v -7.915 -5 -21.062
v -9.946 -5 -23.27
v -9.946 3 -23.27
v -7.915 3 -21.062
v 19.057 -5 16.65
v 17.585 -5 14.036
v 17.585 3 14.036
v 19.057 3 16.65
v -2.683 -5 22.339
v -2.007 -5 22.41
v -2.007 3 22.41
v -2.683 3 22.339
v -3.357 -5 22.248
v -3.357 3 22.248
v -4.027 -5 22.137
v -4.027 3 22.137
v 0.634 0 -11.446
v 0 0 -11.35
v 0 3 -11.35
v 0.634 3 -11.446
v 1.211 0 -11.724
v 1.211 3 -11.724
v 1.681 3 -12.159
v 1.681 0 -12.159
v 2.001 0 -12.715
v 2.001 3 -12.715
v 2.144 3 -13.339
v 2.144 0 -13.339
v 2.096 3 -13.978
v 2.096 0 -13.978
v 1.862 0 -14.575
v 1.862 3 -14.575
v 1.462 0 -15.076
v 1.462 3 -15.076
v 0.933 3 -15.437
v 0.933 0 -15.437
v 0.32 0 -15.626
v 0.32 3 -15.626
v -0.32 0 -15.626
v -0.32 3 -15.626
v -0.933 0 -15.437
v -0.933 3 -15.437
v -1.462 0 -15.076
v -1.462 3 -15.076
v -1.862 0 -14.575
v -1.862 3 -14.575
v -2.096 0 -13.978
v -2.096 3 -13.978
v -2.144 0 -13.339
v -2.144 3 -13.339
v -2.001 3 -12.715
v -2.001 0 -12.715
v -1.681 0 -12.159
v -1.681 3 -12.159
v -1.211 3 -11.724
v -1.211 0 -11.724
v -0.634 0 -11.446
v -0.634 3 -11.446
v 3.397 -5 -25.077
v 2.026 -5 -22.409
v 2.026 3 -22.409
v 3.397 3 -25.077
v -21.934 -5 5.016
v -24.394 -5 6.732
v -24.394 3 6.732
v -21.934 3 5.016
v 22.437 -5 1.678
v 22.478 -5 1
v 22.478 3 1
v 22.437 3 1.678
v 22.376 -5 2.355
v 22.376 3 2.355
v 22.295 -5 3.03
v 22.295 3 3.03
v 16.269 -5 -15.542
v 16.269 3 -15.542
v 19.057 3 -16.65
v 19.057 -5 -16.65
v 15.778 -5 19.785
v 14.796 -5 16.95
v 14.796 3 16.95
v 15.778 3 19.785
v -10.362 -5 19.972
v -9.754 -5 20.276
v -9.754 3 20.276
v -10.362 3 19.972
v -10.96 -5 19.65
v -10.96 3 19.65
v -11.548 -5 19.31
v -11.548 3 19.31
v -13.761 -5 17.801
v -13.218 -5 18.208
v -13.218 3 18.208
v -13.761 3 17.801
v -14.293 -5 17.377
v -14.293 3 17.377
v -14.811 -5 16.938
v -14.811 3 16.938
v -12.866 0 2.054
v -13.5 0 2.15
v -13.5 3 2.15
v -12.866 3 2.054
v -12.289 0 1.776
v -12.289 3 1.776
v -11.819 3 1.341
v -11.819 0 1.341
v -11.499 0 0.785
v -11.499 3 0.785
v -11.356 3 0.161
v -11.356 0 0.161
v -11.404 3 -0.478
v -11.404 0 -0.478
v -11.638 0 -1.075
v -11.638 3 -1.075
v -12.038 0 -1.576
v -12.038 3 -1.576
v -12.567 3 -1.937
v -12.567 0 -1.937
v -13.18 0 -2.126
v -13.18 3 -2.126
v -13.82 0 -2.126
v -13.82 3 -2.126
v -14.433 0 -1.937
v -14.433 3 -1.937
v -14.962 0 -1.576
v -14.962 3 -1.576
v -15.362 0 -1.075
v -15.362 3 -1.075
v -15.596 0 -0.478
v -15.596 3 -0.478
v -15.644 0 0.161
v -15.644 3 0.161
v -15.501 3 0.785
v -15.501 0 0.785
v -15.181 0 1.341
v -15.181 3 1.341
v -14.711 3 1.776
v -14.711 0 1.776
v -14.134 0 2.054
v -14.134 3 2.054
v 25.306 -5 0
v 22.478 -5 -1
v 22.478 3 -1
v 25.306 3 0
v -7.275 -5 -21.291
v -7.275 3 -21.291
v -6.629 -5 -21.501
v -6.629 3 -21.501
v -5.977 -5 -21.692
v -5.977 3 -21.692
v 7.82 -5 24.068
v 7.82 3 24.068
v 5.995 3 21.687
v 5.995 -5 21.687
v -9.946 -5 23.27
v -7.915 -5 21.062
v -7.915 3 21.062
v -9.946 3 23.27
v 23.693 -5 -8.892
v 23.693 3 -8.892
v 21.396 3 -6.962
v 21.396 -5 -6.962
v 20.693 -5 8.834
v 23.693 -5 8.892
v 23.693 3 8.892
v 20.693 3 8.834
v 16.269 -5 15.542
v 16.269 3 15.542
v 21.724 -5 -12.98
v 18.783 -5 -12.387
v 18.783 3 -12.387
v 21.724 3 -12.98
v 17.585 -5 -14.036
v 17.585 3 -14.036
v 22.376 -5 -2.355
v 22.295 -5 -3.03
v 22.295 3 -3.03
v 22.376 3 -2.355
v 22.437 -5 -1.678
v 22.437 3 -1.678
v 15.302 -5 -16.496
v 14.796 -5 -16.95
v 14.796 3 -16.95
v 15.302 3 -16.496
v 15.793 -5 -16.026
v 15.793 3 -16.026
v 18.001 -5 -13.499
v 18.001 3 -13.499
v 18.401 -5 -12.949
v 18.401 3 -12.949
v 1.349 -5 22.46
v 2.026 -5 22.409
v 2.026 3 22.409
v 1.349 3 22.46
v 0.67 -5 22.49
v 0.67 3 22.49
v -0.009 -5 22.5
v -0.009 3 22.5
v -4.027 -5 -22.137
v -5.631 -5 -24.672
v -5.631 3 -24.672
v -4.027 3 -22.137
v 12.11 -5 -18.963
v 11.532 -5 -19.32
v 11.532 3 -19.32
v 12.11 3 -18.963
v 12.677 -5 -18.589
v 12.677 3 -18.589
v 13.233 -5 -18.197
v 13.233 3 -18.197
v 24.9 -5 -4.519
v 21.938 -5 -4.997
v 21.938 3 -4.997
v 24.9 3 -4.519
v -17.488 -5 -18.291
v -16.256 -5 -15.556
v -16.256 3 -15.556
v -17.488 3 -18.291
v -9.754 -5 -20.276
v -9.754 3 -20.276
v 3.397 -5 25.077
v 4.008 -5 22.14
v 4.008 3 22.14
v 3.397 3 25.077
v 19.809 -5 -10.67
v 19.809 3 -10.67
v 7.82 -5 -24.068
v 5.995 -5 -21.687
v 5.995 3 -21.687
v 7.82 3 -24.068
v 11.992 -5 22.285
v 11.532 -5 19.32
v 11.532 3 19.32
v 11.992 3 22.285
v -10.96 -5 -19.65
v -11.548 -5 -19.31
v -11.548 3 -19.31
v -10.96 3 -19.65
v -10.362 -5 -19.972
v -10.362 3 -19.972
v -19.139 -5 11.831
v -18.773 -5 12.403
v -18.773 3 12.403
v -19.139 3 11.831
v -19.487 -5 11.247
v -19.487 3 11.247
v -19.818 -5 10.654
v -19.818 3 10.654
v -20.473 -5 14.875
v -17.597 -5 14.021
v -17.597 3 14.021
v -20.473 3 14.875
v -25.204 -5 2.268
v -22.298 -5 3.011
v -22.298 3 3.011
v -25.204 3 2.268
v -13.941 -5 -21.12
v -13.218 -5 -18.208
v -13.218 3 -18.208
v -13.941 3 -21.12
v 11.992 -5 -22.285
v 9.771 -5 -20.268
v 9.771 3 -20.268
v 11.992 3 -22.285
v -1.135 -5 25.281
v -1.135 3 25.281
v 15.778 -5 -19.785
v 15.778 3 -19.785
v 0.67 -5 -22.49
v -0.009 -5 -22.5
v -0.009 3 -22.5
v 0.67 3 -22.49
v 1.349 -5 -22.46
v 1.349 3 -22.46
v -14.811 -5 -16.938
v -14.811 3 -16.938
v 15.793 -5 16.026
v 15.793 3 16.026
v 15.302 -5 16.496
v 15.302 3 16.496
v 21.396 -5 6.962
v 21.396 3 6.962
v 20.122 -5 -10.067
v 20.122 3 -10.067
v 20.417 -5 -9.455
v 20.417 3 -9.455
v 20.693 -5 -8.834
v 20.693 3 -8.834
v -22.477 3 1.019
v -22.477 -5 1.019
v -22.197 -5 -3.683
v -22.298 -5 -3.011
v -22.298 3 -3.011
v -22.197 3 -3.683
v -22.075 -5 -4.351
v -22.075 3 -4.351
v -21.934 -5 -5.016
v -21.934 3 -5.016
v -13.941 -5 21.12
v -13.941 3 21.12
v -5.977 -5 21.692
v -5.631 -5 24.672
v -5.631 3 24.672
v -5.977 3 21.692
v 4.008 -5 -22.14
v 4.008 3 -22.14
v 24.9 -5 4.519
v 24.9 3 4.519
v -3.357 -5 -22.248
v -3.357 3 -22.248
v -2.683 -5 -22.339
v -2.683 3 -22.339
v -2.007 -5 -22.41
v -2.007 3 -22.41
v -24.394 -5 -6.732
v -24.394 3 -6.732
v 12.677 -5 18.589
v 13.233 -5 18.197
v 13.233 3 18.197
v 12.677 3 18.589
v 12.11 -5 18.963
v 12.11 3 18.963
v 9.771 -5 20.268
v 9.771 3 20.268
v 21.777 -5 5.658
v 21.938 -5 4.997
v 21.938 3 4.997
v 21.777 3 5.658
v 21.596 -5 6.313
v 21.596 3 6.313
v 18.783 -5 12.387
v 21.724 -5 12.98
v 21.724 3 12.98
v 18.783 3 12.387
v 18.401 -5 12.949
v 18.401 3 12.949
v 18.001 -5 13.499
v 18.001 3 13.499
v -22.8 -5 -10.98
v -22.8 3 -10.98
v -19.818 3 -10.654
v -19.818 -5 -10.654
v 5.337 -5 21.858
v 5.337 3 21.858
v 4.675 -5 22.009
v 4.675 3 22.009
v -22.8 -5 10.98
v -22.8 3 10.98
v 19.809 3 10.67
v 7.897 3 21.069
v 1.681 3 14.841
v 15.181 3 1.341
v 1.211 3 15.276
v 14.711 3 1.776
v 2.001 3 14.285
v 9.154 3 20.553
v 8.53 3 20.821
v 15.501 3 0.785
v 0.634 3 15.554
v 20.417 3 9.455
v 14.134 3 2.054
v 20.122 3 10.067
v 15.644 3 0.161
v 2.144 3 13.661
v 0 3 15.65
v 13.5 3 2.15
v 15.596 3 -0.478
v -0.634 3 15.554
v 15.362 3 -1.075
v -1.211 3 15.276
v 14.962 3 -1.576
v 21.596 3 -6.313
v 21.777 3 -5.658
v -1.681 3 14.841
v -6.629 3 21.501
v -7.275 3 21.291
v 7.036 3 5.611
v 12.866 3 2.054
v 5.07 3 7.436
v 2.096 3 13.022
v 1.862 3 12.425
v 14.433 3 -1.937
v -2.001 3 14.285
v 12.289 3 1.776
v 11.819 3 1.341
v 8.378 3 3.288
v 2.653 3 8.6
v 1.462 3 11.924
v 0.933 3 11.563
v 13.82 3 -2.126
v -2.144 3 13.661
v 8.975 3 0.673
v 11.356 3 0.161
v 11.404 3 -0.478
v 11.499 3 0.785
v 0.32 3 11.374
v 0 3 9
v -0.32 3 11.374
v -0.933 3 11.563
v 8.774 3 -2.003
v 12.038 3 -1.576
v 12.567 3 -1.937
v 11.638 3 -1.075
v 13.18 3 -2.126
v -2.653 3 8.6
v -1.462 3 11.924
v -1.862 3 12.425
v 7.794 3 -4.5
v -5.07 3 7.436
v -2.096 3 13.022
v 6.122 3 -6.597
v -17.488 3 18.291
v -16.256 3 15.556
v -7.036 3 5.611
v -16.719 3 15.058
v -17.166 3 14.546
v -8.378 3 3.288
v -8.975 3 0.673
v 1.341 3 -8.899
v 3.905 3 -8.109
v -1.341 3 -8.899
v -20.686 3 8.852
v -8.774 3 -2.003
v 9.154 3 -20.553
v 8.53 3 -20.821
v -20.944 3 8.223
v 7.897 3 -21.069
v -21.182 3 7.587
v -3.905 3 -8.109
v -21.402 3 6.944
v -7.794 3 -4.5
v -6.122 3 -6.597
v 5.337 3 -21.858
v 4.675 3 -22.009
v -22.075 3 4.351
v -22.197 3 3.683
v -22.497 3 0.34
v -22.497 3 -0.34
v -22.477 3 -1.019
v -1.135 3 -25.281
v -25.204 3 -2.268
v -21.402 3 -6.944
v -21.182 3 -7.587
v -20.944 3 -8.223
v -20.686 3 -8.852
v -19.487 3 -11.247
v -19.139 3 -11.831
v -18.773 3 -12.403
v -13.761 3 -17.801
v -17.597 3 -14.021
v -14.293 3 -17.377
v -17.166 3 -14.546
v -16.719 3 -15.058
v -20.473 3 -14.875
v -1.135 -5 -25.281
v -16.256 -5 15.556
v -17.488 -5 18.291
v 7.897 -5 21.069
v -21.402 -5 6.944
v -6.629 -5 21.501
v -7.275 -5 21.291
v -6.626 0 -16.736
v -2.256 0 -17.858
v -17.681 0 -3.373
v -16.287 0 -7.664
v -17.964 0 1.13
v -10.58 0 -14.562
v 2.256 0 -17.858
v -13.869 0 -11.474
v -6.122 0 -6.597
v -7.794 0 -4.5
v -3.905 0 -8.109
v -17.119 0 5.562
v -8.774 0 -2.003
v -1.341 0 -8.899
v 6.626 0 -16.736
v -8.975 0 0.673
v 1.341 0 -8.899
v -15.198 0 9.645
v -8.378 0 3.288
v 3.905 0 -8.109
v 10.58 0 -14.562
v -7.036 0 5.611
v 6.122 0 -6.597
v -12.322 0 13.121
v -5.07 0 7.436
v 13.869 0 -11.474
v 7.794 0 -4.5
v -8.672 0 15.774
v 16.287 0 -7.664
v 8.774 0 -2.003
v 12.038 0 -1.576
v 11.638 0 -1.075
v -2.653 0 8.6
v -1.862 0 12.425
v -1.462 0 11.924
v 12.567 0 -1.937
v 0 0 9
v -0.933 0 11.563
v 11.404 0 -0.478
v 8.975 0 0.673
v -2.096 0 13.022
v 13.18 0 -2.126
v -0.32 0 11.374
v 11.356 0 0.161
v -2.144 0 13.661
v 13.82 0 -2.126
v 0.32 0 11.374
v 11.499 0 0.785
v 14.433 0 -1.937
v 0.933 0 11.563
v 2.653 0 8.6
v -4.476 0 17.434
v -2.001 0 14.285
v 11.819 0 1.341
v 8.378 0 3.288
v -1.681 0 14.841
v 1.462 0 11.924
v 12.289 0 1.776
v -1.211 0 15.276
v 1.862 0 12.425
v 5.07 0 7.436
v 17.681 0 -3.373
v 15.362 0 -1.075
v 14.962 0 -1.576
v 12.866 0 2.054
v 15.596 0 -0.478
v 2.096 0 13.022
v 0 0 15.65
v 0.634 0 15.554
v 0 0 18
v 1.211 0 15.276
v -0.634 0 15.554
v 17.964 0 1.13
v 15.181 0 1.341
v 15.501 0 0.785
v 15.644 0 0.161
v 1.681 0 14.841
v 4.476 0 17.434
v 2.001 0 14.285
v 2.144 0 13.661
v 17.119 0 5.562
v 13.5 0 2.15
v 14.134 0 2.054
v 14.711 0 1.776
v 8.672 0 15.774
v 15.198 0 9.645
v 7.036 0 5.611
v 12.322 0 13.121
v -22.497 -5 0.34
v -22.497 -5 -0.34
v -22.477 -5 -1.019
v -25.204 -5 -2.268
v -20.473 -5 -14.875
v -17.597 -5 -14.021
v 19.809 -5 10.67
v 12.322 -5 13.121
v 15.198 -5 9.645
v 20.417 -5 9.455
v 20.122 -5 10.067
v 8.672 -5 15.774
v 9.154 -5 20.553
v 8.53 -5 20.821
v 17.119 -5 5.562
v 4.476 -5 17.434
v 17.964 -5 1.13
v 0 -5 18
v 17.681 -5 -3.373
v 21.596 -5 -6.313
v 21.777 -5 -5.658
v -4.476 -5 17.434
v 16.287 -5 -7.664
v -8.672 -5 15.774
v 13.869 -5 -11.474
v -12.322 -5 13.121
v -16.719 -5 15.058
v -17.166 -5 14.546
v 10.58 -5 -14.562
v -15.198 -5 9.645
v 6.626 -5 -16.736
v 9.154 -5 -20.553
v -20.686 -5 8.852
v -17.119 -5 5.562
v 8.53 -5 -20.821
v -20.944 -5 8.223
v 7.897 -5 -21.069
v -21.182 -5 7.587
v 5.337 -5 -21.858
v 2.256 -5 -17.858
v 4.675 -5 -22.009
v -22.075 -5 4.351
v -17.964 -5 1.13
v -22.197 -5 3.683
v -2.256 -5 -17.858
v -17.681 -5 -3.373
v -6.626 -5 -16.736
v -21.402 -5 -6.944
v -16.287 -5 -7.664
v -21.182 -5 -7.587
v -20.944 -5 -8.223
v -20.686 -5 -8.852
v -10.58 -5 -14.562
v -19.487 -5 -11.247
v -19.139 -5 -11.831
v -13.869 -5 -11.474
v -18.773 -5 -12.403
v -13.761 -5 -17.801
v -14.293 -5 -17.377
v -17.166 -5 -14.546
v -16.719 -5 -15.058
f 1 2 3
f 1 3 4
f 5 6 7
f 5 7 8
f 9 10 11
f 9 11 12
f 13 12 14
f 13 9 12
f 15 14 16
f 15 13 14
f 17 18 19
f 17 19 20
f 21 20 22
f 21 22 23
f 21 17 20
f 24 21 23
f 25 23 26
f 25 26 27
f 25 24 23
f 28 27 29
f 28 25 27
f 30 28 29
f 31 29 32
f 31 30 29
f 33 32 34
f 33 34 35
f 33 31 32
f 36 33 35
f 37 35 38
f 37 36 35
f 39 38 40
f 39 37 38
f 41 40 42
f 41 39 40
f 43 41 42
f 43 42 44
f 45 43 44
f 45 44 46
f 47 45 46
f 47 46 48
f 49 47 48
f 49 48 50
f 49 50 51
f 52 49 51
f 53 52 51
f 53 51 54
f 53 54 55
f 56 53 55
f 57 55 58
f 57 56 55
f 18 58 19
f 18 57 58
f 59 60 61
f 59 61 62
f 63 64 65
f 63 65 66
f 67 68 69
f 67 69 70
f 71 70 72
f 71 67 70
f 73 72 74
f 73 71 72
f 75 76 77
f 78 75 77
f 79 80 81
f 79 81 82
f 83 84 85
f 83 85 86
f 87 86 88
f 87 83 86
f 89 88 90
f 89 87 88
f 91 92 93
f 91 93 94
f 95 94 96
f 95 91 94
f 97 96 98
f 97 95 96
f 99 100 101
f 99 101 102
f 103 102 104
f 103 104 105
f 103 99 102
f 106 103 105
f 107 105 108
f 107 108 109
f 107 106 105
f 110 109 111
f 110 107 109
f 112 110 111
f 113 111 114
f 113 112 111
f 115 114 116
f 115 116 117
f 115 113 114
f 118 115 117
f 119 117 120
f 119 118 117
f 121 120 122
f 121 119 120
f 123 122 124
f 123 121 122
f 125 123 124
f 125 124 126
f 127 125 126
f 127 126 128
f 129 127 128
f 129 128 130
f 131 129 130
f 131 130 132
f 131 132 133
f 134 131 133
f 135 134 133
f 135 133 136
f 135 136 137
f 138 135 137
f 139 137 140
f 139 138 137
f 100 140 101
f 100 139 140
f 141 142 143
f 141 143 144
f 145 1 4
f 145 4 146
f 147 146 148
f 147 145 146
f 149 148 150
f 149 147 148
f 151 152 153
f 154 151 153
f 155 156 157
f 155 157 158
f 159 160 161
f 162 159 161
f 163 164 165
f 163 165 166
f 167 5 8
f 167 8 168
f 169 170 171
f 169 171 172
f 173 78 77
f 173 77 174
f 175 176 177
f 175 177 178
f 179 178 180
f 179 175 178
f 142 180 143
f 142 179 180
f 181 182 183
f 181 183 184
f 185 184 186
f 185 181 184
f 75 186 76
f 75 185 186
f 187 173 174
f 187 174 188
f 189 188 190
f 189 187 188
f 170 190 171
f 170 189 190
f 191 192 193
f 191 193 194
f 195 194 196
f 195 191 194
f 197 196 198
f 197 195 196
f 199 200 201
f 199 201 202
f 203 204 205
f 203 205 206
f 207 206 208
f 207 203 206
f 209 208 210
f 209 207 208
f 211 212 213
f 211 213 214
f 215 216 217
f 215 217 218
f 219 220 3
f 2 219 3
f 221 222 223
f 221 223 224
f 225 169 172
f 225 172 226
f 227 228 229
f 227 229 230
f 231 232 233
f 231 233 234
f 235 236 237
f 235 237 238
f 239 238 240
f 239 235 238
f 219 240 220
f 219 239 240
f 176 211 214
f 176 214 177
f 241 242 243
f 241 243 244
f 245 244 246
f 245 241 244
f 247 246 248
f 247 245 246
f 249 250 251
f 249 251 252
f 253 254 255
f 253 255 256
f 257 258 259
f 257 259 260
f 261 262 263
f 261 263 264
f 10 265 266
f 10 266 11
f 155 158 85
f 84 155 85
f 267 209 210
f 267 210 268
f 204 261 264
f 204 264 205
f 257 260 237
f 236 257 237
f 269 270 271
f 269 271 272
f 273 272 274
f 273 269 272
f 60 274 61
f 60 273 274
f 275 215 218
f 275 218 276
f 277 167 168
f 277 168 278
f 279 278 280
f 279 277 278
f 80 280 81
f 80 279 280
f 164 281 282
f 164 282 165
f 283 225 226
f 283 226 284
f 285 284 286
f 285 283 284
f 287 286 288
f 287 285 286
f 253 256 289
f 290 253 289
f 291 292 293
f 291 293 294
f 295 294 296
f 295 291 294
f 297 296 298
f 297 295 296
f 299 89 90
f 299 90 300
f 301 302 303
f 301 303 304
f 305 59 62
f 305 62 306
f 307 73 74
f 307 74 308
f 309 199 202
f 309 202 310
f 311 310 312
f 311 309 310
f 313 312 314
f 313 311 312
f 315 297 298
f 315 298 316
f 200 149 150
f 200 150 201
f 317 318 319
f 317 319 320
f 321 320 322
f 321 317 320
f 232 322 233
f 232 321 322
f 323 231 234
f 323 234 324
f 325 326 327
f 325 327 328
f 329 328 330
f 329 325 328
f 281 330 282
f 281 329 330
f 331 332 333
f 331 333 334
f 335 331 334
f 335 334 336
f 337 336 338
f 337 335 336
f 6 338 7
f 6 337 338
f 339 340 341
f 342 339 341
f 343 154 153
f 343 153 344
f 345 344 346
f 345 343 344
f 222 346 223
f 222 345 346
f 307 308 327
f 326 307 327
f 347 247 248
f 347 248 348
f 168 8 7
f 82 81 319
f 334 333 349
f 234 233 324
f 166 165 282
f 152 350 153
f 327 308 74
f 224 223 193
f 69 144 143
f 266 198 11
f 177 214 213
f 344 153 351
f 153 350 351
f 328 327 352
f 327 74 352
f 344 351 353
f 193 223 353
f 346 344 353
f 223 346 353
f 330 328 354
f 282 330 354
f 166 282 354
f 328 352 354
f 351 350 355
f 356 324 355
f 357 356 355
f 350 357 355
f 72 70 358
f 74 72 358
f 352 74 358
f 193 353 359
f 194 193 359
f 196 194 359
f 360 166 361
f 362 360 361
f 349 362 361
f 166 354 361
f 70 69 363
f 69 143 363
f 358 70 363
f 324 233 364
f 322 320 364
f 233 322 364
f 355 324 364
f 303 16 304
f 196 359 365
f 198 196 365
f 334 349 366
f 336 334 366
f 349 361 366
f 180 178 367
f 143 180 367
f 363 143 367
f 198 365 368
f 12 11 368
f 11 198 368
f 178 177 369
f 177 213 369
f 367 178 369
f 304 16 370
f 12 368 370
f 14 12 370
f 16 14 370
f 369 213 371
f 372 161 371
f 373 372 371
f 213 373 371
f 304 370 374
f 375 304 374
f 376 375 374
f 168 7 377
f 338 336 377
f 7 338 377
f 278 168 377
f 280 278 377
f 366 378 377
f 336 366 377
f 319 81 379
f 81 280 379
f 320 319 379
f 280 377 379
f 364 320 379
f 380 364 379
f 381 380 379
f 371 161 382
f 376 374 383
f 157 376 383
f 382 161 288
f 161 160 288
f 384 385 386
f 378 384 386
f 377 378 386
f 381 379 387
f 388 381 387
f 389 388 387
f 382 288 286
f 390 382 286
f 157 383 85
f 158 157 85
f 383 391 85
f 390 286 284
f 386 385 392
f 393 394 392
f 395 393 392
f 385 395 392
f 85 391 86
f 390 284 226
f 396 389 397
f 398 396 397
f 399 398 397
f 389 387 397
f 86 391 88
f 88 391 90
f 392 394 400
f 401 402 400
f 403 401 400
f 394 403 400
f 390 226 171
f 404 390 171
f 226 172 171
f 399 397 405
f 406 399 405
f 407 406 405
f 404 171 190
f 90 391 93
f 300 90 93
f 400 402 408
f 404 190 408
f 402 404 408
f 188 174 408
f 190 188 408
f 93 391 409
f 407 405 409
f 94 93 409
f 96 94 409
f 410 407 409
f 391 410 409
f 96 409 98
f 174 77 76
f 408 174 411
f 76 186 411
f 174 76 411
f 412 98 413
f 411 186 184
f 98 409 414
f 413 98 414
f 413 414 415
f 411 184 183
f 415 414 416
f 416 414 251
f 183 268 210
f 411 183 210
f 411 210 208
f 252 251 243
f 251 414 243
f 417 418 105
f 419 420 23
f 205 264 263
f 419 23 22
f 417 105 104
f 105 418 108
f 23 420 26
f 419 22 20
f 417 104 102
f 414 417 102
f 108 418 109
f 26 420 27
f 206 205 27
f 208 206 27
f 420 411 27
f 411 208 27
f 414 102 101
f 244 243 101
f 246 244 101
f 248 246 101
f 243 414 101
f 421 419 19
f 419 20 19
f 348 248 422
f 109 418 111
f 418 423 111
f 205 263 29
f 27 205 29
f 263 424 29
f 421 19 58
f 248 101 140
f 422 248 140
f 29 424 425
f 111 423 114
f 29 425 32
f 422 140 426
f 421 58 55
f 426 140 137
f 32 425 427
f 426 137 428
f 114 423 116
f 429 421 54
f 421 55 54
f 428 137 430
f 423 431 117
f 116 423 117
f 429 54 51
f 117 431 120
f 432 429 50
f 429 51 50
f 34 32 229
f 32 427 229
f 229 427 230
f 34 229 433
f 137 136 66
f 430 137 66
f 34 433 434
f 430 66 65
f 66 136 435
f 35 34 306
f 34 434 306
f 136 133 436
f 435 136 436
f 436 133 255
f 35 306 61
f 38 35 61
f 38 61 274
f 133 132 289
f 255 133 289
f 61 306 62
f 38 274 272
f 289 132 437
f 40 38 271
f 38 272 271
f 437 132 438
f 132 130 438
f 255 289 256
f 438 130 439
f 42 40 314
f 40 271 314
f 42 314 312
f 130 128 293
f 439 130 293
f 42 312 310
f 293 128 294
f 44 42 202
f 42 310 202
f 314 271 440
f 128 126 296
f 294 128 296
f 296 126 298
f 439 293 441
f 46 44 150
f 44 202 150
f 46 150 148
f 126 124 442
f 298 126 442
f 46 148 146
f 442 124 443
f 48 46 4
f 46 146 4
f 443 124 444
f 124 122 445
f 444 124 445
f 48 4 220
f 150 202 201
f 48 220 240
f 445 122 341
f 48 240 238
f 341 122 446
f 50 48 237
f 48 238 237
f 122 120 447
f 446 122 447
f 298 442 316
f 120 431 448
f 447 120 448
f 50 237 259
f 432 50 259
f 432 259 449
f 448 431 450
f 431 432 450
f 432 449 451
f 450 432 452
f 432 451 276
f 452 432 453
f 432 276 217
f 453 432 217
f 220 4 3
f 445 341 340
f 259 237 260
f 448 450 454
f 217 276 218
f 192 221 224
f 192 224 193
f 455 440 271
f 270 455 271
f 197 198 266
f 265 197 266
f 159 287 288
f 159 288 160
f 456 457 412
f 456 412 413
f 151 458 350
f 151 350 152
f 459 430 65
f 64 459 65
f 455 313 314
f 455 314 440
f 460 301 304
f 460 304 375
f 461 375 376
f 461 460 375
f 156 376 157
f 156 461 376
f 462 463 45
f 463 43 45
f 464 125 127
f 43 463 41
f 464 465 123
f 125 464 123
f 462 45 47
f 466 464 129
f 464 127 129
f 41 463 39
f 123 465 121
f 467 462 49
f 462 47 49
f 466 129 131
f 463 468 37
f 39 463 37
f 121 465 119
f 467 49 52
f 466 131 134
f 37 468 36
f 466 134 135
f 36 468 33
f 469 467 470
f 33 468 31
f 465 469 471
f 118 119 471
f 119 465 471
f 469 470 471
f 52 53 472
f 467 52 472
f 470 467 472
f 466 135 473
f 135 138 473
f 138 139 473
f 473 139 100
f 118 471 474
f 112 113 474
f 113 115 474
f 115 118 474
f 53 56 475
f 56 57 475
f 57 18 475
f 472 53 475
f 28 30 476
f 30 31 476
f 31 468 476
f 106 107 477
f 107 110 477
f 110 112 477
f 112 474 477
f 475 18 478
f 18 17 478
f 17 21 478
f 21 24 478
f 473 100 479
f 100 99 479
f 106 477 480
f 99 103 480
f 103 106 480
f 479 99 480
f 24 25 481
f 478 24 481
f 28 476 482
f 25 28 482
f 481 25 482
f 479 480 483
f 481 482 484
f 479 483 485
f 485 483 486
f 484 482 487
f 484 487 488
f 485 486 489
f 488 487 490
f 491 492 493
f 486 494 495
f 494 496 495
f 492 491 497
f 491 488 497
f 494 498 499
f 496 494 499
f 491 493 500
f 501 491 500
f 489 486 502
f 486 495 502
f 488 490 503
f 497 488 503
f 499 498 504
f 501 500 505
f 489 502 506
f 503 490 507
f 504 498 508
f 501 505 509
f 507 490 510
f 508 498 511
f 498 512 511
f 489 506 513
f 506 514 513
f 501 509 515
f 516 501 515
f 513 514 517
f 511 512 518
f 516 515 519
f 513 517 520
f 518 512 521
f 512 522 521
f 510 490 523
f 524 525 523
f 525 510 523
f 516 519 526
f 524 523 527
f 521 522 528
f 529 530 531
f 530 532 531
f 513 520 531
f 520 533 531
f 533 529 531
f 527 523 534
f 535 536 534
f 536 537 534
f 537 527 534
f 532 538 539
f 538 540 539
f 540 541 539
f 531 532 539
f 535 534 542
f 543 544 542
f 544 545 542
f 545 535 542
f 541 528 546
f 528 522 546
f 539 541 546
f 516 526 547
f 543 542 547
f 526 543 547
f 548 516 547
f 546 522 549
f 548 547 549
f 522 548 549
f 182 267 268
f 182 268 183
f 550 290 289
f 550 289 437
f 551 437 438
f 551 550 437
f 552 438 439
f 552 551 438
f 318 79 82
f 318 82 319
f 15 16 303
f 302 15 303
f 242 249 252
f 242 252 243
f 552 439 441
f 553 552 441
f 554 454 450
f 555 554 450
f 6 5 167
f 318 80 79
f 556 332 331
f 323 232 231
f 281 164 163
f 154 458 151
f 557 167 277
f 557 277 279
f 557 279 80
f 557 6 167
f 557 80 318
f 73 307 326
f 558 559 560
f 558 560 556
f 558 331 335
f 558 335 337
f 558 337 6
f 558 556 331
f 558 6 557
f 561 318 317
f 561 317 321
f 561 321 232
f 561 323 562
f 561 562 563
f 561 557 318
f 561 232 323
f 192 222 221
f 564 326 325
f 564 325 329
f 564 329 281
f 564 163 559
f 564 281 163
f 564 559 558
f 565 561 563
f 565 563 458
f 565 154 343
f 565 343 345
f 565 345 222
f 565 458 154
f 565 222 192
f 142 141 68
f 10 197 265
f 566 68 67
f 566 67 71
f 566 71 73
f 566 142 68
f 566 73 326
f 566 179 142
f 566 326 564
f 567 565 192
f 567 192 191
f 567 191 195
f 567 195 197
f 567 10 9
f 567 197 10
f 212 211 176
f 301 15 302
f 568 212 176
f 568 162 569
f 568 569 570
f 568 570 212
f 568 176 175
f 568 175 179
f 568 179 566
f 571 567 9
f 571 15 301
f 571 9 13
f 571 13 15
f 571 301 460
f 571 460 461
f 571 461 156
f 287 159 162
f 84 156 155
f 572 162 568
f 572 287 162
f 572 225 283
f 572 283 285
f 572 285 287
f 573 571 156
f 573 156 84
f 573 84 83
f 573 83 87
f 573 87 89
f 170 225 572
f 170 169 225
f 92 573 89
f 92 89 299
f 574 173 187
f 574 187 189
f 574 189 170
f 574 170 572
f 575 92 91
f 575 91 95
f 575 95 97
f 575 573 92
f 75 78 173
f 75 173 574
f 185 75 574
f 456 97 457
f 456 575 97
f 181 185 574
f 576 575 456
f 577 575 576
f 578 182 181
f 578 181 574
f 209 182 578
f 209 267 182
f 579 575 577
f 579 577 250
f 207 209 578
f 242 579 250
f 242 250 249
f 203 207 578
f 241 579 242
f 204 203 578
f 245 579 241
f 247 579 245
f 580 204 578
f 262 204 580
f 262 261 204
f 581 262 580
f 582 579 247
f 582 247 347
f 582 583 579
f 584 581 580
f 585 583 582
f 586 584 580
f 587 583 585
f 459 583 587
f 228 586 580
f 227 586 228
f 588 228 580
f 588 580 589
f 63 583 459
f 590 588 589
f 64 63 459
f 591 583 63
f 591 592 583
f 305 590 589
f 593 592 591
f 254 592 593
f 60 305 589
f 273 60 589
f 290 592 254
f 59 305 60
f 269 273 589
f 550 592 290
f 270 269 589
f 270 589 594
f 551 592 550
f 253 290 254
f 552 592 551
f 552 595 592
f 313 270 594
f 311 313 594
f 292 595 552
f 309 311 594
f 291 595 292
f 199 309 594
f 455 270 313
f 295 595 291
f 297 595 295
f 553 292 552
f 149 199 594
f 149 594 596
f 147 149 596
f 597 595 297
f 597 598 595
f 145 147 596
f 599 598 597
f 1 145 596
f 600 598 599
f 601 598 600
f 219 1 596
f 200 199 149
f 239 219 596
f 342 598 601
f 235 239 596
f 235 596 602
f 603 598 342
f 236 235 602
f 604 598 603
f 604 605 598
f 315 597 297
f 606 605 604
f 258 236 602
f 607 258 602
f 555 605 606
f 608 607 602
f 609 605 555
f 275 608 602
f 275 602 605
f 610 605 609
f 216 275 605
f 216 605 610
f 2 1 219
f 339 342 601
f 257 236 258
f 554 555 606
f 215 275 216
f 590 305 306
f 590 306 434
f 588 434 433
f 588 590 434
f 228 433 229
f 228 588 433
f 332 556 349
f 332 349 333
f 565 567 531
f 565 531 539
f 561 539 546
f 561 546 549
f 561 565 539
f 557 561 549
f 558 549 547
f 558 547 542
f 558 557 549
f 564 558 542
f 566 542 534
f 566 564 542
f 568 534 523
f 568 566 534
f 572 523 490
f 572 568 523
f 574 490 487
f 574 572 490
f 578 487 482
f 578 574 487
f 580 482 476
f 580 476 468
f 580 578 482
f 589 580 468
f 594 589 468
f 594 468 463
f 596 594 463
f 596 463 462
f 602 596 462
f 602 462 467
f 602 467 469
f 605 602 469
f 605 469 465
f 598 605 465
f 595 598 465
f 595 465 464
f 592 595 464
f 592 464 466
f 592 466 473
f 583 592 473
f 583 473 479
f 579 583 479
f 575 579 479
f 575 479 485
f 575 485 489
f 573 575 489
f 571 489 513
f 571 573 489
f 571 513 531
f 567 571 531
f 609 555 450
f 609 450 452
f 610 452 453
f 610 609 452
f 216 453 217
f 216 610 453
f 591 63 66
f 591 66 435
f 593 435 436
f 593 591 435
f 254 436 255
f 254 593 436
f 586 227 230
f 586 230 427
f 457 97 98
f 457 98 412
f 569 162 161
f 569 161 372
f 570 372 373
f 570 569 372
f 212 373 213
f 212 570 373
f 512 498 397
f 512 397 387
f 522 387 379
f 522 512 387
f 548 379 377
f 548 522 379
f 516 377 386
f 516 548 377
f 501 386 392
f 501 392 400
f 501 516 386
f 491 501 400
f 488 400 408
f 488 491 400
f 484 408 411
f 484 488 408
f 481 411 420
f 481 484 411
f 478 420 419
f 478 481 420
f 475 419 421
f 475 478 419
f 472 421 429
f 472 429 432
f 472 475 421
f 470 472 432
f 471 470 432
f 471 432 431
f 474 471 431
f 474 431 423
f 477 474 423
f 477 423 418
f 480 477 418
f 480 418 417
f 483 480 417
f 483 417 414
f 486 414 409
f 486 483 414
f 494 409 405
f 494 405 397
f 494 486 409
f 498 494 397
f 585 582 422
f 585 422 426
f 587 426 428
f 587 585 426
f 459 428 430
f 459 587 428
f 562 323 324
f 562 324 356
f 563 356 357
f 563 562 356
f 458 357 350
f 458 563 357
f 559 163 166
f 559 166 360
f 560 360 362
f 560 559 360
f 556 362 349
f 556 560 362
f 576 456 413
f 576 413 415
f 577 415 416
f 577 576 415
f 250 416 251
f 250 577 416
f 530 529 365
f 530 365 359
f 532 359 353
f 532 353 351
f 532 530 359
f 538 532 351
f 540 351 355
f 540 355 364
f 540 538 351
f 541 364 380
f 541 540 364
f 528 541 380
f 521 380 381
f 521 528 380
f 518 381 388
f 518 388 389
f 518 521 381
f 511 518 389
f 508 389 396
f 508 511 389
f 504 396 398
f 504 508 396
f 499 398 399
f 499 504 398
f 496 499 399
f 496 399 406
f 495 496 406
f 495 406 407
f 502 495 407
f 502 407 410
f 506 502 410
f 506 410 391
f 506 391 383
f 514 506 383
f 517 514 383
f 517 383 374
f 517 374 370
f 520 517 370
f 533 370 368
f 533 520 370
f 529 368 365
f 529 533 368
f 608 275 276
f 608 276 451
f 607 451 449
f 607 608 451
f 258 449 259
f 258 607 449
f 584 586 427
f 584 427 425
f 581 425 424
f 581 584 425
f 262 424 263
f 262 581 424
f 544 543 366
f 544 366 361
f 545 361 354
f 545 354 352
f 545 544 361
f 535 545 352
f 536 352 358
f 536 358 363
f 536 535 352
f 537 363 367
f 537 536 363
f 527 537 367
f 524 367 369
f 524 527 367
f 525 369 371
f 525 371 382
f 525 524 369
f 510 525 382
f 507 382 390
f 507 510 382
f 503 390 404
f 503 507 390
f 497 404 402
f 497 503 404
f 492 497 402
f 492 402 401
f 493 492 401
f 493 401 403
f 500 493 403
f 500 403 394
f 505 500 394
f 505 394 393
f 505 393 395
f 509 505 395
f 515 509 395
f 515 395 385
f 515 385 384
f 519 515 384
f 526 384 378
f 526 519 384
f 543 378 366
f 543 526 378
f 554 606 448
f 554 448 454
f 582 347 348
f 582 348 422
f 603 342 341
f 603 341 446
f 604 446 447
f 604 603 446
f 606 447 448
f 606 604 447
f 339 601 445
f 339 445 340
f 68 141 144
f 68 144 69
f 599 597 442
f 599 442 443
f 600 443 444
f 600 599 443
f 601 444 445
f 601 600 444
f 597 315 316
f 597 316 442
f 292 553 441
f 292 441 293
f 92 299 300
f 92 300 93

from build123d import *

# Parameters (mm, degrees)
SKETCH1_R           = 18
SKETCH1_R_2         = 9
SKETCH1_R_3         = 2.15
BOSS_EXTRUDE1_DEPTH = 3
BOSS_EXTRUDE2_START = -8
SKETCH2_R           = 18
BOSS_EXTRUDE2_DEPTH = 8


with BuildPart() as part:
    # Sketch1 → Boss-Extrude1 (new body)
    with BuildSketch(Plane(origin=(0, 0, 0), x_dir=(1, 0, 0), z_dir=(0, 1, 0))):
        with Locations(Location((0, 0, 0), (0, 0, 270))):
            Circle(SKETCH1_R)
        with Locations(Location((0, 0, 0), (0, 0, 270))):
            Circle(SKETCH1_R_2, mode=Mode.SUBTRACT)
        with Locations(Location((0, -13.5, 0), (0, 0, 270))):
            Circle(SKETCH1_R_3, mode=Mode.SUBTRACT)
        with Locations(Location((-13.5, 0, 0), (0, 0, 270))):
            Circle(SKETCH1_R_3, mode=Mode.SUBTRACT)
        with Locations(Location((0, 13.5, 0), (0, 0, 270))):
            Circle(SKETCH1_R_3, mode=Mode.SUBTRACT)
        with Locations(Location((13.5, 0, 0), (0, 0, 270))):
            Circle(SKETCH1_R_3, mode=Mode.SUBTRACT)
    extrude(amount=BOSS_EXTRUDE1_DEPTH)

    # Sketch2 → Boss-Extrude2 (add)
    with BuildSketch(Plane(origin=(0, 3, 0), x_dir=(1, 0, 0), z_dir=(0, 1, 0)).offset(BOSS_EXTRUDE2_START)):
        with BuildLine():
            Line((22.477766793, 1), (25.306193918, 0))
            Line((25.306193918, 0), (22.477766793, -1))
            ThreePointArc((22.477766793, -1), (22.409421615, -2.01688445), (22.295096728, -3.029630652))
            Line((22.295096728, -3.029630652), (24.89951297, -4.518595405))
            Line((24.89951297, -4.518595405), (21.937982938, -4.997489829))
            ThreePointArc((21.937982938, -4.997489829), (21.689164366, -5.985829025), (21.39584391, -6.961886482))
            Line((21.39584391, -6.961886482), (23.692541189, -8.891959436))
            Line((23.692541189, -8.891959436), (20.693094262, -8.834356223))
            ThreePointArc((20.693094262, -8.834356223), (20.271799528, -9.76238413), (19.808911064, -10.670381552))
            Line((19.808911064, -10.670381552), (21.724071639, -12.979528574))
            Line((21.724071639, -12.979528574), (18.783112509, -12.387279139))
            ThreePointArc((18.783112509, -12.387279139), (18.202882373, -13.225168177), (17.585303517, -14.03592178))
            Line((17.585303517, -14.03592178), (19.057372553, -16.649924985))
            Line((19.057372553, -16.649924985), (16.269426065, -15.542064712))
            ThreePointArc((16.269426065, -15.542064712), (15.548909602, -16.262884436), (14.796489846, -16.950335932))
            Line((14.796489846, -16.950335932), (15.778153832, -19.785179106))
            Line((15.778153832, -19.785179106), (13.232826882, -18.197315536))
            ThreePointArc((13.232826882, -18.197315536), (12.395182083, -18.777898209), (11.532104817, -19.319952342))
            Line((11.532104817, -19.319952342), (11.991812264, -22.284521292))
            Line((11.991812264, -22.284521292), (9.770913754, -20.267689666))
            ThreePointArc((9.770913754, -20.267689666), (8.843063212, -20.689374882), (7.897068451, -21.068609586))
            Line((7.897068451, -21.068609586), (7.820043984, -24.067620628))
            Line((7.820043984, -24.067620628), (5.994955418, -21.686643575))
            ThreePointArc((5.994955418, -21.686643575), (5.006721014, -21.935878024), (4.008213807, -22.140104383))
            Line((4.008213807, -22.140104383), (3.396933055, -25.077166834))
            Line((3.396933055, -25.077166834), (2.026314283, -22.408570914))
            ThreePointArc((2.026314283, -22.408570914), (1.009458683, -22.477343997), (-0.009468127, -22.499998008))
            Line((-0.009468127, -22.499998008), (-1.135358097, -25.280712264))
            Line((-1.135358097, -25.280712264), (-2.00745426, -22.410268347))
            ThreePointArc((-2.00745426, -22.410268347), (-3.020248481, -22.29636964), (-4.026845748, -22.136723184))
            Line((-4.026845748, -22.136723184), (-5.631157905, -24.671714801))
            Line((-5.631157905, -24.671714801), (-5.976701572, -21.691681316))
            ThreePointArc((-5.976701572, -21.691681316), (-6.952882373, -21.398771617), (-7.914797233, -21.061955863))
            Line((-7.914797233, -21.061955863), (-9.945967666, -23.269748125))
            Line((-9.945967666, -23.269748125), (-9.753852778, -20.275905799))
            ThreePointArc((-9.753852778, -20.275905799), (-10.662044906, -19.813399467), (-11.548360622, -19.31023995))
            Line((-11.548360622, -19.31023995), (-13.941105841, -21.119872597))
            Line((-13.941105841, -21.119872597), (-13.21750713, -18.208445987))
            ThreePointArc((-13.21750713, -18.208445987), (-14.028520542, -17.591208356), (-14.810750199, -16.937877037))
            Line((-14.810750199, -16.937877037), (-17.488165405, -18.291186987))
            Line((-17.488165405, -18.291186987), (-16.256339927, -15.555751739))
            ThreePointArc((-16.256339927, -15.555751739), (-16.944107985, -14.803621334), (-17.597110079, -14.02111682))
            Line((-17.597110079, -14.02111682), (-20.473140942, -14.874607576))
            Line((-20.473140942, -14.874607576), (-18.772680583, -12.403082831))
            ThreePointArc((-18.772680583, -12.403082831), (-19.315097856, -11.540233742), (-19.817884361, -10.653706371))
            Line((-19.817884361, -10.653706371), (-22.800092885, -10.97994604))
            Line((-22.800092885, -10.97994604), (-20.68565184, -8.851768635))
            ThreePointArc((-20.68565184, -8.851768635), (-21.065284589, -7.905933542), (-21.401695534, -6.943877034))
            Line((-21.401695534, -6.943877034), (-24.394231082, -6.732380003))
            Line((-24.394231082, -6.732380003), (-21.933769225, -5.015951312))
            ThreePointArc((-21.933769225, -5.015951312), (-22.138415743, -4.017530133), (-22.297638603, -3.010865775))
            Line((-22.297638603, -3.010865775), (-25.204318621, -2.268429734))
            Line((-25.204318621, -2.268429734), (-22.476917221, -1.018917187))
            ThreePointArc((-22.476917221, -1.018917187), (-22.5, 0), (-22.476917221, 1.018917187))
            Line((-22.476917221, 1.018917187), (-25.204318621, 2.268429734))
            Line((-25.204318621, 2.268429734), (-22.297638603, 3.010865775))
            ThreePointArc((-22.297638603, 3.010865775), (-22.138415743, 4.017530133), (-21.933769225, 5.015951312))
            Line((-21.933769225, 5.015951312), (-24.394231082, 6.732380003))
            Line((-24.394231082, 6.732380003), (-21.401695534, 6.943877034))
            ThreePointArc((-21.401695534, 6.943877034), (-21.065284589, 7.905933542), (-20.68565184, 8.851768635))
            Line((-20.68565184, 8.851768635), (-22.800092885, 10.97994604))
            Line((-22.800092885, 10.97994604), (-19.817884361, 10.653706371))
            ThreePointArc((-19.817884361, 10.653706371), (-19.315097856, 11.540233742), (-18.772680583, 12.403082831))
            Line((-18.772680583, 12.403082831), (-20.473140942, 14.874607576))
            Line((-20.473140942, 14.874607576), (-17.597110079, 14.02111682))
            ThreePointArc((-17.597110079, 14.02111682), (-16.944107985, 14.803621334), (-16.256339927, 15.555751739))
            Line((-16.256339927, 15.555751739), (-17.488165405, 18.291186987))
            Line((-17.488165405, 18.291186987), (-14.810750199, 16.937877037))
            ThreePointArc((-14.810750199, 16.937877037), (-14.028520542, 17.591208356), (-13.21750713, 18.208445987))
            Line((-13.21750713, 18.208445987), (-13.941105841, 21.119872597))
            Line((-13.941105841, 21.119872597), (-11.548360622, 19.31023995))
            ThreePointArc((-11.548360622, 19.31023995), (-10.662044906, 19.813399467), (-9.753852778, 20.275905799))
            Line((-9.753852778, 20.275905799), (-9.945967666, 23.269748125))
            Line((-9.945967666, 23.269748125), (-7.914797233, 21.061955863))
            ThreePointArc((-7.914797233, 21.061955863), (-6.952882373, 21.398771617), (-5.976701572, 21.691681316))
            Line((-5.976701572, 21.691681316), (-5.631157905, 24.671714801))
            Line((-5.631157905, 24.671714801), (-4.026845748, 22.136723184))
            ThreePointArc((-4.026845748, 22.136723184), (-3.020248481, 22.29636964), (-2.00745426, 22.410268347))
            Line((-2.00745426, 22.410268347), (-1.135358097, 25.280712264))
            Line((-1.135358097, 25.280712264), (-0.009468127, 22.499998008))
            ThreePointArc((-0.009468127, 22.499998008), (1.009458683, 22.477343997), (2.026314283, 22.408570914))
            Line((2.026314283, 22.408570914), (3.396933055, 25.077166834))
            Line((3.396933055, 25.077166834), (4.008213807, 22.140104383))
            ThreePointArc((4.008213807, 22.140104383), (5.006721014, 21.935878024), (5.994955418, 21.686643575))
            Line((5.994955418, 21.686643575), (7.820043984, 24.067620628))
            Line((7.820043984, 24.067620628), (7.897068451, 21.068609586))
            ThreePointArc((7.897068451, 21.068609586), (8.843063212, 20.689374882), (9.770913754, 20.267689666))
            Line((9.770913754, 20.267689666), (11.991812264, 22.284521292))
            Line((11.991812264, 22.284521292), (11.532104817, 19.319952342))
            ThreePointArc((11.532104817, 19.319952342), (12.395182083, 18.777898209), (13.232826882, 18.197315536))
            Line((13.232826882, 18.197315536), (15.778153832, 19.785179106))
            Line((15.778153832, 19.785179106), (14.796489846, 16.950335932))
            ThreePointArc((14.796489846, 16.950335932), (15.548909602, 16.262884436), (16.269426065, 15.542064712))
            Line((16.269426065, 15.542064712), (19.057372553, 16.649924985))
            Line((19.057372553, 16.649924985), (17.585303517, 14.03592178))
            ThreePointArc((17.585303517, 14.03592178), (18.202882373, 13.225168177), (18.783112509, 12.387279139))
            Line((18.783112509, 12.387279139), (21.724071639, 12.979528574))
            Line((21.724071639, 12.979528574), (19.808911064, 10.670381552))
            ThreePointArc((19.808911064, 10.670381552), (20.271799528, 9.76238413), (20.693094262, 8.834356223))
            Line((20.693094262, 8.834356223), (23.692541189, 8.891959436))
            Line((23.692541189, 8.891959436), (21.39584391, 6.961886482))
            ThreePointArc((21.39584391, 6.961886482), (21.689164366, 5.985829025), (21.937982938, 4.997489829))
            Line((21.937982938, 4.997489829), (24.89951297, 4.518595405))
            Line((24.89951297, 4.518595405), (22.295096728, 3.029630652))
            ThreePointArc((22.295096728, 3.029630652), (22.409421615, 2.01688445), (22.477766793, 1))
        make_face()
        with Locations(Location((0, 0, 0), (0, 0, 270))):
            Circle(SKETCH2_R, mode=Mode.SUBTRACT)
    extrude(amount=BOSS_EXTRUDE2_DEPTH)


solid = part.part
